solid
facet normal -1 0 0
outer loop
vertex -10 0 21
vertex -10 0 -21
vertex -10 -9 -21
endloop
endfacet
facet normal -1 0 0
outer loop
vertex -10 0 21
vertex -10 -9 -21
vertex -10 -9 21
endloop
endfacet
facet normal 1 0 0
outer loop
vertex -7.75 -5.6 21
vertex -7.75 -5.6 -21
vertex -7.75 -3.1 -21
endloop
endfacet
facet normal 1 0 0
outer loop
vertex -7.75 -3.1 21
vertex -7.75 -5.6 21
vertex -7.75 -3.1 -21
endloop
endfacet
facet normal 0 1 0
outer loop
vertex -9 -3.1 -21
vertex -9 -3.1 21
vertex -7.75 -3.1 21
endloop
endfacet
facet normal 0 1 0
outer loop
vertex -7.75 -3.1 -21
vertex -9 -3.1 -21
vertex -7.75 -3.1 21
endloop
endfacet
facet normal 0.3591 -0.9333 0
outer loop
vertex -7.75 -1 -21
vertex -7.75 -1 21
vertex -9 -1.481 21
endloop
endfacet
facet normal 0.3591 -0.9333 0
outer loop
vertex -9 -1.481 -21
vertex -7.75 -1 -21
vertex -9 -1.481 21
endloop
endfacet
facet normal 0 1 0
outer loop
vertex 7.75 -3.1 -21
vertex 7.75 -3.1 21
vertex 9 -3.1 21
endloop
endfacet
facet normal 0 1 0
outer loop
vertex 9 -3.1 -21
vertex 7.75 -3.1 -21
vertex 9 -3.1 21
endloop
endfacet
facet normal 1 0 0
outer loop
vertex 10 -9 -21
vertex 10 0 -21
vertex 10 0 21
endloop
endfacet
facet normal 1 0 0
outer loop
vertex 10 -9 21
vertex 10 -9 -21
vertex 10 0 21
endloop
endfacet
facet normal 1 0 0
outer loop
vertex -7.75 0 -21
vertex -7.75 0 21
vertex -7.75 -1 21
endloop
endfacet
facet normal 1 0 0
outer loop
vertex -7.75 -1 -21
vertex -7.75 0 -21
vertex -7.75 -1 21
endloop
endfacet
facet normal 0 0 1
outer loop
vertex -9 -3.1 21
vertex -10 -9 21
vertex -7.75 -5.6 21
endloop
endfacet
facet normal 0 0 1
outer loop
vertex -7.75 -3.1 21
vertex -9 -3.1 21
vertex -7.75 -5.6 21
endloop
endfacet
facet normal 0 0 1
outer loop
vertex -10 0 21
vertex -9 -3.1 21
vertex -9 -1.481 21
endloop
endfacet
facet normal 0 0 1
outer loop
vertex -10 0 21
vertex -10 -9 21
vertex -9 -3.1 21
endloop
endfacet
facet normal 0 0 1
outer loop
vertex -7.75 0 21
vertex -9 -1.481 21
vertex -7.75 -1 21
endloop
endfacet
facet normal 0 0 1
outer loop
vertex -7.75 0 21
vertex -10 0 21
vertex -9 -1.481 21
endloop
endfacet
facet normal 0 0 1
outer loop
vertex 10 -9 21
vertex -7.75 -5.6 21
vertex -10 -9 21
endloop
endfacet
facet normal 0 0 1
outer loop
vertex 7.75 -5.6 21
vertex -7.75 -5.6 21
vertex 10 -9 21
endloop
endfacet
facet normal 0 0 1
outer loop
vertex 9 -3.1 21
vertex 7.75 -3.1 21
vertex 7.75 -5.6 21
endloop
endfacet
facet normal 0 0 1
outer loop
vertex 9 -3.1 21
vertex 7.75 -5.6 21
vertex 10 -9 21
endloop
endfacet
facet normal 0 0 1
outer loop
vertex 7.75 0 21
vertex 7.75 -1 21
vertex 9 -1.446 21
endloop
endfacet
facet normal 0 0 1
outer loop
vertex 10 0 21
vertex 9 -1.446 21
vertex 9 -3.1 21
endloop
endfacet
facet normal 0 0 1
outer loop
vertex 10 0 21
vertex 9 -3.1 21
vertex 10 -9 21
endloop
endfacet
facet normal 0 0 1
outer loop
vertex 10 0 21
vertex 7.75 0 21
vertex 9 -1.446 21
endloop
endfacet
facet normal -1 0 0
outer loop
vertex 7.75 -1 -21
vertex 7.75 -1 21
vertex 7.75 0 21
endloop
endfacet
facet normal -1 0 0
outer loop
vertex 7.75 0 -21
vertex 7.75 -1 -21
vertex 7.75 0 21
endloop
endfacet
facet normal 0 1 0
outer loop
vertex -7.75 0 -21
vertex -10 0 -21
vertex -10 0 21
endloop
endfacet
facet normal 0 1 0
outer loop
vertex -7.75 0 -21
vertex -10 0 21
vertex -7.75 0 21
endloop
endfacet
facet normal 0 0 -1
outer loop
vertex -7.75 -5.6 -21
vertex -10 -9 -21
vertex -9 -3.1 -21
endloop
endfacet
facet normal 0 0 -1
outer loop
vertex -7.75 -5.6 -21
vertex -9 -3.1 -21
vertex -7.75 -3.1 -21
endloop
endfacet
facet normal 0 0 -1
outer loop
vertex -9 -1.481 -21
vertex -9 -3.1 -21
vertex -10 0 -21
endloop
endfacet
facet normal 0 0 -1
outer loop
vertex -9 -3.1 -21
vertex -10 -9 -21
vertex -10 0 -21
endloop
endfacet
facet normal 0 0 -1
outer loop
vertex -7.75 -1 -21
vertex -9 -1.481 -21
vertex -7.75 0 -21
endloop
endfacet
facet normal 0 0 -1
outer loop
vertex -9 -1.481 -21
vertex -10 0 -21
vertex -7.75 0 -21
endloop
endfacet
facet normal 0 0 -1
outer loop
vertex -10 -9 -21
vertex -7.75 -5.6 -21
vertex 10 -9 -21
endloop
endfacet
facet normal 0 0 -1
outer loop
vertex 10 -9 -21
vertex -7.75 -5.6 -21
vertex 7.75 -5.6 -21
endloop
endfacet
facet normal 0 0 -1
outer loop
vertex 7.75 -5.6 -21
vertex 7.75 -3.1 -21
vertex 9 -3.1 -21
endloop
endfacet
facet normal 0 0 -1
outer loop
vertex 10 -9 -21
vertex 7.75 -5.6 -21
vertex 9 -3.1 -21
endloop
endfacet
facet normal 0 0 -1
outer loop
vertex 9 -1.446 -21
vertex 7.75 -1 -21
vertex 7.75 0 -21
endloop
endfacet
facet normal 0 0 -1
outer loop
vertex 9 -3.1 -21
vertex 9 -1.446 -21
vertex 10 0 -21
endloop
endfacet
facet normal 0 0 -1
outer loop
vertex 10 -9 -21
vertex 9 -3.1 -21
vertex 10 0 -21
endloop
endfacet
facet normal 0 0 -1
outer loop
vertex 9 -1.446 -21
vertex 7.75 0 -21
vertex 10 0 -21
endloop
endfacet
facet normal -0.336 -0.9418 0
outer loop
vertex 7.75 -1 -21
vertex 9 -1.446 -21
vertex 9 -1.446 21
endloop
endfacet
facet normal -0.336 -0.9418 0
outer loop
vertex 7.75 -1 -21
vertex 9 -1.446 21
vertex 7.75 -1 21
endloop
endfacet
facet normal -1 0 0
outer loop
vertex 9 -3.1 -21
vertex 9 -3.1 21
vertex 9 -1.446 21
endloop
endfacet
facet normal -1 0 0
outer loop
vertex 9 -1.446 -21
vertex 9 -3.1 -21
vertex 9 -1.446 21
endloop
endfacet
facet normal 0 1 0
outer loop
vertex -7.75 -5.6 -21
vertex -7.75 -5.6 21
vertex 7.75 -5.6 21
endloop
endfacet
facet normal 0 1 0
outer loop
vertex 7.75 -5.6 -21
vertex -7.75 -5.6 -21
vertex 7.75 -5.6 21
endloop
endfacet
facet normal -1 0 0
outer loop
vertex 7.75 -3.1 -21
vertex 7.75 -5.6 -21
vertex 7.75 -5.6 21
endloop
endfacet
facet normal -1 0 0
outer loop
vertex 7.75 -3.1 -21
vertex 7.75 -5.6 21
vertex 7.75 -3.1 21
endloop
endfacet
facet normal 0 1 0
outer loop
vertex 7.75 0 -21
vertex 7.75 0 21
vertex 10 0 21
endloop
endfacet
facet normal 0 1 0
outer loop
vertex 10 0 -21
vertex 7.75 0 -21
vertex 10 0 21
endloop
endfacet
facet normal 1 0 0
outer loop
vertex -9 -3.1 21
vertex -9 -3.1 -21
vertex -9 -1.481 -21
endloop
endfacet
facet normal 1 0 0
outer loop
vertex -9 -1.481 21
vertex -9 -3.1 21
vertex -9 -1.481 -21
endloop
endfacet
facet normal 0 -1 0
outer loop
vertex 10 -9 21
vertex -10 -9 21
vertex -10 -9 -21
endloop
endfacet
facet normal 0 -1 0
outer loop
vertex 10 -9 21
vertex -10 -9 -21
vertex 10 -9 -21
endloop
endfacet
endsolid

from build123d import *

# Parameters (mm, degrees)
F0_W        = 20
F0_H        = 42
F1_DEPTH    = 9
F2_W        = 15.5
F2_H        = 1.5
F2_H_2      = 1.6
F2_W_2      = 1.25
F2_H_3      = 2.5
F3_DEPTH    = 42.001
F4_T4_DEPTH = 48.7433158126
F5_T4_DEPTH = 49.2642981969


# Not quite as in the source:
# - a fillet or chamfer that OpenCascade refuses, or shapes differently, is made with other operations: its cross-section is extruded or revolved along the edge and cut away or added


with BuildPart() as f1:
    # F0 (on Front) → F1 (new body)
    with BuildSketch(Plane.XZ):
        Rectangle(F0_W, F0_H)
    extrude(amount=F1_DEPTH)

    # F2 (on face) → F3 (cut, through all)
    with BuildSketch(Plane.XY.offset(21)):
        with Locations((0, -0.75)):
            Rectangle(F2_W, F2_H)
        with Locations((0, -2.3)):
            Rectangle(F2_W, F2_H_2)
        with Locations((-8.375, -2.3)):
            Rectangle(F2_W_2, F2_H_2)
        with Locations((8.375, -2.3)):
            Rectangle(F2_W_2, F2_H_2)
        with Locations((0, -4.35)):
            Rectangle(F2_W, F2_H_3)
    extrude(amount=-F3_DEPTH, mode=Mode.SUBTRACT)

    # F4: chamfer of 1.3 x 0.5 on 1 edges, made by hand


with BuildPart() as f4_tool2:
    # F4_s3 → F4_t4 (new body)
    with BuildSketch(Plane.XY.offset(24.3716579063)):
        Polygon((-7.75, -1), (-9.05, -1.5), (-7.75, -1.5), align=None)
    extrude(amount=-F4_T4_DEPTH)

    split(bisect_by=Plane.YZ.offset(-9), keep=Keep.TOP)


with BuildPart() as f1_1:
    add(f1.part)

    # F4_t1: cut F4_tool2
    add(f4_tool2.part, mode=Mode.SUBTRACT)

    # F5: chamfer of 1.4 x 0.5 on 1 edges, made by hand


with BuildPart() as f5_tool2:
    # F5_s3 → F5_t4 (new body)
    with BuildSketch(Plane.XY.offset(24.6321490984)):
        Polygon((9.15, -1.5), (7.75, -1), (7.75, -1.5), align=None)
    extrude(amount=-F5_T4_DEPTH)

    split(bisect_by=Plane.YZ.offset(9), keep=Keep.BOTTOM)


with BuildPart() as f1_2:
    add(f1_1.part)

    # F5_t1: cut F5_tool2
    add(f5_tool2.part, mode=Mode.SUBTRACT)


solid = f1_2.part
